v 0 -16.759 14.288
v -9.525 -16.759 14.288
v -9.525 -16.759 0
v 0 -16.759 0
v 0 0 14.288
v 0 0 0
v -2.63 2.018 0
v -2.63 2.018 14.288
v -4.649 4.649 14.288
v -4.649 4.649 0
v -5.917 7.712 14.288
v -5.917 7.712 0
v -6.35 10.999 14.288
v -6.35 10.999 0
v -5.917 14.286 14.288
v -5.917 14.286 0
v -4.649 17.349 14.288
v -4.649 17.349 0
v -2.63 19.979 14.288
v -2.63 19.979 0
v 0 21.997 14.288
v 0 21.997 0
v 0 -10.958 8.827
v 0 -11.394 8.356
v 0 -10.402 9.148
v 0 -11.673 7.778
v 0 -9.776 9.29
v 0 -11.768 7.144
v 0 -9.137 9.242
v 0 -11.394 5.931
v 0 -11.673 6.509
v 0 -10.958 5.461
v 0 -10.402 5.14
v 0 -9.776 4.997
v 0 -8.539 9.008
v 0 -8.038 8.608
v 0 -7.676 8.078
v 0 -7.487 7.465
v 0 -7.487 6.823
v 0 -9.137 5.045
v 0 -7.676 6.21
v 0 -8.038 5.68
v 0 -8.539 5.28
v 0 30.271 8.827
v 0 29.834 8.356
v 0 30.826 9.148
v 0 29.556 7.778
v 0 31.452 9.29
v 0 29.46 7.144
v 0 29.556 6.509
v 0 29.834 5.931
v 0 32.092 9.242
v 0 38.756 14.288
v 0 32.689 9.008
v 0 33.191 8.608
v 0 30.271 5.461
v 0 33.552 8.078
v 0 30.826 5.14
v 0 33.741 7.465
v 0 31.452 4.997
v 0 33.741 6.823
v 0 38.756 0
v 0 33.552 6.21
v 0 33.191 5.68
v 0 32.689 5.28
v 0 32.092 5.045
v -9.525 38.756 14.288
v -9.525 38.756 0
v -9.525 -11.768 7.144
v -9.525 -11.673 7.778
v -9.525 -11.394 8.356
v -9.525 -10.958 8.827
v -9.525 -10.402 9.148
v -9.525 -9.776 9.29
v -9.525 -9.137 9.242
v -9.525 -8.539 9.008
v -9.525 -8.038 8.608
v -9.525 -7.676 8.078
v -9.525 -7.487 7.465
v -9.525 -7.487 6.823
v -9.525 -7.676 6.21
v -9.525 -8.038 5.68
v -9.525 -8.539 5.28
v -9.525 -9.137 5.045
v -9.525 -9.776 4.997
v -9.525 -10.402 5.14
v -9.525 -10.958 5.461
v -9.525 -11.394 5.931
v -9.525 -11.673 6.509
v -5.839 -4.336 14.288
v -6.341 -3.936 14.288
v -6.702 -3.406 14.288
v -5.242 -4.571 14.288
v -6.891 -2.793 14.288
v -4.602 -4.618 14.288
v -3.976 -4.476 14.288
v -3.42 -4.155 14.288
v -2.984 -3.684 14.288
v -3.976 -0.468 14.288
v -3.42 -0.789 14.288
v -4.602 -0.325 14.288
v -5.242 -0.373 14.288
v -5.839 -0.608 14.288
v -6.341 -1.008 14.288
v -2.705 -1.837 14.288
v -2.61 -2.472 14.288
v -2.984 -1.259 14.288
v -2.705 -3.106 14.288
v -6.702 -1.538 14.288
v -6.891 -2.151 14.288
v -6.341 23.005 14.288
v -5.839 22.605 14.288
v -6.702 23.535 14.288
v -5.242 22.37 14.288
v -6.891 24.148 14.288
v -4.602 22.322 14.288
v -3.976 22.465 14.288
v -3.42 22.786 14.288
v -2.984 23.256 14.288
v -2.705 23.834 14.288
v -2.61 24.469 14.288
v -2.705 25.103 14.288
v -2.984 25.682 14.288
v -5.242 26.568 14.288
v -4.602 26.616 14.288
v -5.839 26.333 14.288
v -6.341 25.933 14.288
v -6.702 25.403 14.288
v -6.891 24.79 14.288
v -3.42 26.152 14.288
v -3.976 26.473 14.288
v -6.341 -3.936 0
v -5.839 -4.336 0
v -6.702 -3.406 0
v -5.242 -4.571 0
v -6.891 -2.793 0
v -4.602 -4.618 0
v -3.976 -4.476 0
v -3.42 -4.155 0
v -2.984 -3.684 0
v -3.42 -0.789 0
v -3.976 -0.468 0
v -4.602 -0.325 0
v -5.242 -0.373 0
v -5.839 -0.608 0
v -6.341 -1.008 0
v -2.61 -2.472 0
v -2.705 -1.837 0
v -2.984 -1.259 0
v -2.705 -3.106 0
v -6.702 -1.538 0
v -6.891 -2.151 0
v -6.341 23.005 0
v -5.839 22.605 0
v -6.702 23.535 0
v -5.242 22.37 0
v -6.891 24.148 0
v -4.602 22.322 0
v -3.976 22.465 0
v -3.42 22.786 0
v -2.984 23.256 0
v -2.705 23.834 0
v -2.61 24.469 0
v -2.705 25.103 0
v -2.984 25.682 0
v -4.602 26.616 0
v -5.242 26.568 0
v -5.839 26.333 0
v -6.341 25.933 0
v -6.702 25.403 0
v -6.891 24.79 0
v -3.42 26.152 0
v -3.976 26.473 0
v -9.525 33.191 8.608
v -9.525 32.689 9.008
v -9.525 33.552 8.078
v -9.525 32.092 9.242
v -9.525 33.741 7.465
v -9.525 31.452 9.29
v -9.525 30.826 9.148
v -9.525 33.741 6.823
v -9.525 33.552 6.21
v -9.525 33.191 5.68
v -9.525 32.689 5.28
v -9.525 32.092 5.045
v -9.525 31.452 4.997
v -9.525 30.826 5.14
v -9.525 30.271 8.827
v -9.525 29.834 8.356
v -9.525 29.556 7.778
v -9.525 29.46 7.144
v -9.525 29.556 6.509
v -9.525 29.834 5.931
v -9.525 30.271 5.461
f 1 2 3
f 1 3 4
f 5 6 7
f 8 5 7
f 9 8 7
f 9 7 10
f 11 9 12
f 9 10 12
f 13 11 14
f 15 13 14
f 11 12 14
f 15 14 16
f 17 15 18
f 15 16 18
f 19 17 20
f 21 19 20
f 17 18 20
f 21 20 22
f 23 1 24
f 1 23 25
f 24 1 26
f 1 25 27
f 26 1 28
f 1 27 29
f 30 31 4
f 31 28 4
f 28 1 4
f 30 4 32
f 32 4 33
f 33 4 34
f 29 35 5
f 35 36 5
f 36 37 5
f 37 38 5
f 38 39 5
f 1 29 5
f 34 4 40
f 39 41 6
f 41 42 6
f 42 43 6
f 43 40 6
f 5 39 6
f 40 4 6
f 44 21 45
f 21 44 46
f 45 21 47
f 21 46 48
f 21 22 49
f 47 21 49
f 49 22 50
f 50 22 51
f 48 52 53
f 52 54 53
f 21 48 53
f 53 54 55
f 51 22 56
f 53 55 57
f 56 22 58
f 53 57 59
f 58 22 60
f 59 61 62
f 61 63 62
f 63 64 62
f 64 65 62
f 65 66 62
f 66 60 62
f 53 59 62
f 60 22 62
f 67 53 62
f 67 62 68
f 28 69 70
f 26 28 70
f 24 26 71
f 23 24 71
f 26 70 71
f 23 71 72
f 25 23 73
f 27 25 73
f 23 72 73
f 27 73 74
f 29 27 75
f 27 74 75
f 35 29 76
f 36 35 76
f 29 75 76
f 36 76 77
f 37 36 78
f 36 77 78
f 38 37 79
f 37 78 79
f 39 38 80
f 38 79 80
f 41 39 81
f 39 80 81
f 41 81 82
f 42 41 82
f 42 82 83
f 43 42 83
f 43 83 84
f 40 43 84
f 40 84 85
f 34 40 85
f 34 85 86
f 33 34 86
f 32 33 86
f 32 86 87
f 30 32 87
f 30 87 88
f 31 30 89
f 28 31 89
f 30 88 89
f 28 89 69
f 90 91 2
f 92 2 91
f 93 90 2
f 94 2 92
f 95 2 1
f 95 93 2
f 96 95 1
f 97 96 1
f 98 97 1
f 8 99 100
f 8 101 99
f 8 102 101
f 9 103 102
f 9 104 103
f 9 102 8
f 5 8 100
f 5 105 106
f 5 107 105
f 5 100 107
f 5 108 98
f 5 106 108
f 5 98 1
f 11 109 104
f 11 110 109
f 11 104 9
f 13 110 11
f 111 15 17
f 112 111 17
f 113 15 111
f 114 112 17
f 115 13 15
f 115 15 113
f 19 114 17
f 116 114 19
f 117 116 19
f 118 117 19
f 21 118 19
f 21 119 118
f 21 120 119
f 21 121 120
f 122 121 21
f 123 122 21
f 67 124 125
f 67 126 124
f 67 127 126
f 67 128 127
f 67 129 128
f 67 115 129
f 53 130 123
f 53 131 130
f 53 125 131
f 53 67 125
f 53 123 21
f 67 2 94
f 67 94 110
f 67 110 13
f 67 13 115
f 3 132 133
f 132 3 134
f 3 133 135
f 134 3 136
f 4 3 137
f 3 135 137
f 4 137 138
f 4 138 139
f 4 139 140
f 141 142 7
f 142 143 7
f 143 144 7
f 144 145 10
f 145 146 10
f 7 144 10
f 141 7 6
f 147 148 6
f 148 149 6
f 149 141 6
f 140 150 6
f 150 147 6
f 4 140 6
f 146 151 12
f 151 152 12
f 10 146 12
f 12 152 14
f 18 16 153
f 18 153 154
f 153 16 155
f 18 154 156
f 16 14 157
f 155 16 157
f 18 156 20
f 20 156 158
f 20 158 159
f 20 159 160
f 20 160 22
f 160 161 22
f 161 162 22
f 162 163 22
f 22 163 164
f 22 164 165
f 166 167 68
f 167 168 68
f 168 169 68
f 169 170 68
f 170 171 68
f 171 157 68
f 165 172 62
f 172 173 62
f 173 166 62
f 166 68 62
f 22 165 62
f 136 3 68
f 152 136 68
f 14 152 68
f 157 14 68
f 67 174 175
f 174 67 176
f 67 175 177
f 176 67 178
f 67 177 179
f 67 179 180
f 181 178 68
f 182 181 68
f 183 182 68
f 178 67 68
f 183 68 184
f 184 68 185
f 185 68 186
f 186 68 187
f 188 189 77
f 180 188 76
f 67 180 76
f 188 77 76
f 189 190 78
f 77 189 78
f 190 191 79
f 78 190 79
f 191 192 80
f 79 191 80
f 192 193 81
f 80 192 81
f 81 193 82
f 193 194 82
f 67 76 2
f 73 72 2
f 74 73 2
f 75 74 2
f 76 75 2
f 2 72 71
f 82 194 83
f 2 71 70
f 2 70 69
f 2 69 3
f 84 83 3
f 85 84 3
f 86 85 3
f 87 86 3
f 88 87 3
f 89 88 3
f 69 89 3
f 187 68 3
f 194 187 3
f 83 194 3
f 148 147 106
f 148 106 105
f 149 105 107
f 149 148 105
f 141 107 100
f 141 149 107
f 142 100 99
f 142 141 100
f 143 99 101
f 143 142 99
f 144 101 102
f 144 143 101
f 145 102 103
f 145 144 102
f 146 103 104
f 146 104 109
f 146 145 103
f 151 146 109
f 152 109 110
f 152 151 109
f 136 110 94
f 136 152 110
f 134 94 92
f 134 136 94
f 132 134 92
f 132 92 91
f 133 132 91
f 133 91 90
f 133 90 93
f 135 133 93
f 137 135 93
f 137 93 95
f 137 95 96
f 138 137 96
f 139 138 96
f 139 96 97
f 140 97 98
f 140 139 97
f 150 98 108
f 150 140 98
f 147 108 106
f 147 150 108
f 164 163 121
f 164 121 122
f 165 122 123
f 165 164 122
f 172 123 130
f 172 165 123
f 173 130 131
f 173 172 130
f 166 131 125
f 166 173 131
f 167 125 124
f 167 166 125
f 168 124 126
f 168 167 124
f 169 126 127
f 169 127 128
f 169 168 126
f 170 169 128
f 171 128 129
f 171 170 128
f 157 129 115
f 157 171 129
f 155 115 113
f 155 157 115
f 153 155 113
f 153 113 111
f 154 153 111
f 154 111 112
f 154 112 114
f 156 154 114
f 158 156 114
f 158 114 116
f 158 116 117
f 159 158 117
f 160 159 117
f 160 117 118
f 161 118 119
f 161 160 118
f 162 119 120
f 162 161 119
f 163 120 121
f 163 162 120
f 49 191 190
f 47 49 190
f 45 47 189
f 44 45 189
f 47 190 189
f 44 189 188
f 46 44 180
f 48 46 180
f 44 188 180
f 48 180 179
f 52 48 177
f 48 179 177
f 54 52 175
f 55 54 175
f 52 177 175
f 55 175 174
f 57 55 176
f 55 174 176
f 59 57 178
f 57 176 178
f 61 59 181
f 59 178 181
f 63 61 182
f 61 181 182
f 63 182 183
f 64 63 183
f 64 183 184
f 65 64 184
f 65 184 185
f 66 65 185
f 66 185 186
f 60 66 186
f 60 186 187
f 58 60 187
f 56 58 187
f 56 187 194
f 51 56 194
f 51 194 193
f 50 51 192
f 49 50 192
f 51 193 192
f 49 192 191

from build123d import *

# Parameters (mm, degrees)
F0_R     = 2.15265
F1_DEPTH = 14.2875
F2_R     = 2.15265
F3_DEPTH = 9.525


with BuildPart() as f1:
    # F0 (on Top) → F1 (new body)
    with BuildSketch(Plane.XY):
        with BuildLine():
            ThreePointArc((0, 0), (-6.35, 10.998523), (0, 21.997045))
            Line((0, 21.997045), (0, 38.756407))
            Line((0, 38.756407), (-9.525, 38.756407))
            Line((-9.525, 38.756407), (-9.525, -16.759362))
            Line((-9.525, -16.759362), (0, -16.759362))
            Line((0, -16.759362), (0, 0))
        make_face()
        with Locations((-4.7625, -2.471862)):
            Circle(F0_R, mode=Mode.SUBTRACT)
        with Locations((-4.7625, 24.468907)):
            Circle(F0_R, mode=Mode.SUBTRACT)
    extrude(amount=F1_DEPTH)

    # F2 (on face) → F3 (cut, through all)
    with BuildSketch(Plane(origin=(-9.525, 0, 0), x_dir=(0, -1, 0), z_dir=(-1, 0, 0))):
        with Locations((9.615612, 7.14375)):
            Circle(F2_R)
        with Locations((-31.612657, 7.14375)):
            Circle(F2_R)
    extrude(amount=-F3_DEPTH, mode=Mode.SUBTRACT)


solid = f1.part
